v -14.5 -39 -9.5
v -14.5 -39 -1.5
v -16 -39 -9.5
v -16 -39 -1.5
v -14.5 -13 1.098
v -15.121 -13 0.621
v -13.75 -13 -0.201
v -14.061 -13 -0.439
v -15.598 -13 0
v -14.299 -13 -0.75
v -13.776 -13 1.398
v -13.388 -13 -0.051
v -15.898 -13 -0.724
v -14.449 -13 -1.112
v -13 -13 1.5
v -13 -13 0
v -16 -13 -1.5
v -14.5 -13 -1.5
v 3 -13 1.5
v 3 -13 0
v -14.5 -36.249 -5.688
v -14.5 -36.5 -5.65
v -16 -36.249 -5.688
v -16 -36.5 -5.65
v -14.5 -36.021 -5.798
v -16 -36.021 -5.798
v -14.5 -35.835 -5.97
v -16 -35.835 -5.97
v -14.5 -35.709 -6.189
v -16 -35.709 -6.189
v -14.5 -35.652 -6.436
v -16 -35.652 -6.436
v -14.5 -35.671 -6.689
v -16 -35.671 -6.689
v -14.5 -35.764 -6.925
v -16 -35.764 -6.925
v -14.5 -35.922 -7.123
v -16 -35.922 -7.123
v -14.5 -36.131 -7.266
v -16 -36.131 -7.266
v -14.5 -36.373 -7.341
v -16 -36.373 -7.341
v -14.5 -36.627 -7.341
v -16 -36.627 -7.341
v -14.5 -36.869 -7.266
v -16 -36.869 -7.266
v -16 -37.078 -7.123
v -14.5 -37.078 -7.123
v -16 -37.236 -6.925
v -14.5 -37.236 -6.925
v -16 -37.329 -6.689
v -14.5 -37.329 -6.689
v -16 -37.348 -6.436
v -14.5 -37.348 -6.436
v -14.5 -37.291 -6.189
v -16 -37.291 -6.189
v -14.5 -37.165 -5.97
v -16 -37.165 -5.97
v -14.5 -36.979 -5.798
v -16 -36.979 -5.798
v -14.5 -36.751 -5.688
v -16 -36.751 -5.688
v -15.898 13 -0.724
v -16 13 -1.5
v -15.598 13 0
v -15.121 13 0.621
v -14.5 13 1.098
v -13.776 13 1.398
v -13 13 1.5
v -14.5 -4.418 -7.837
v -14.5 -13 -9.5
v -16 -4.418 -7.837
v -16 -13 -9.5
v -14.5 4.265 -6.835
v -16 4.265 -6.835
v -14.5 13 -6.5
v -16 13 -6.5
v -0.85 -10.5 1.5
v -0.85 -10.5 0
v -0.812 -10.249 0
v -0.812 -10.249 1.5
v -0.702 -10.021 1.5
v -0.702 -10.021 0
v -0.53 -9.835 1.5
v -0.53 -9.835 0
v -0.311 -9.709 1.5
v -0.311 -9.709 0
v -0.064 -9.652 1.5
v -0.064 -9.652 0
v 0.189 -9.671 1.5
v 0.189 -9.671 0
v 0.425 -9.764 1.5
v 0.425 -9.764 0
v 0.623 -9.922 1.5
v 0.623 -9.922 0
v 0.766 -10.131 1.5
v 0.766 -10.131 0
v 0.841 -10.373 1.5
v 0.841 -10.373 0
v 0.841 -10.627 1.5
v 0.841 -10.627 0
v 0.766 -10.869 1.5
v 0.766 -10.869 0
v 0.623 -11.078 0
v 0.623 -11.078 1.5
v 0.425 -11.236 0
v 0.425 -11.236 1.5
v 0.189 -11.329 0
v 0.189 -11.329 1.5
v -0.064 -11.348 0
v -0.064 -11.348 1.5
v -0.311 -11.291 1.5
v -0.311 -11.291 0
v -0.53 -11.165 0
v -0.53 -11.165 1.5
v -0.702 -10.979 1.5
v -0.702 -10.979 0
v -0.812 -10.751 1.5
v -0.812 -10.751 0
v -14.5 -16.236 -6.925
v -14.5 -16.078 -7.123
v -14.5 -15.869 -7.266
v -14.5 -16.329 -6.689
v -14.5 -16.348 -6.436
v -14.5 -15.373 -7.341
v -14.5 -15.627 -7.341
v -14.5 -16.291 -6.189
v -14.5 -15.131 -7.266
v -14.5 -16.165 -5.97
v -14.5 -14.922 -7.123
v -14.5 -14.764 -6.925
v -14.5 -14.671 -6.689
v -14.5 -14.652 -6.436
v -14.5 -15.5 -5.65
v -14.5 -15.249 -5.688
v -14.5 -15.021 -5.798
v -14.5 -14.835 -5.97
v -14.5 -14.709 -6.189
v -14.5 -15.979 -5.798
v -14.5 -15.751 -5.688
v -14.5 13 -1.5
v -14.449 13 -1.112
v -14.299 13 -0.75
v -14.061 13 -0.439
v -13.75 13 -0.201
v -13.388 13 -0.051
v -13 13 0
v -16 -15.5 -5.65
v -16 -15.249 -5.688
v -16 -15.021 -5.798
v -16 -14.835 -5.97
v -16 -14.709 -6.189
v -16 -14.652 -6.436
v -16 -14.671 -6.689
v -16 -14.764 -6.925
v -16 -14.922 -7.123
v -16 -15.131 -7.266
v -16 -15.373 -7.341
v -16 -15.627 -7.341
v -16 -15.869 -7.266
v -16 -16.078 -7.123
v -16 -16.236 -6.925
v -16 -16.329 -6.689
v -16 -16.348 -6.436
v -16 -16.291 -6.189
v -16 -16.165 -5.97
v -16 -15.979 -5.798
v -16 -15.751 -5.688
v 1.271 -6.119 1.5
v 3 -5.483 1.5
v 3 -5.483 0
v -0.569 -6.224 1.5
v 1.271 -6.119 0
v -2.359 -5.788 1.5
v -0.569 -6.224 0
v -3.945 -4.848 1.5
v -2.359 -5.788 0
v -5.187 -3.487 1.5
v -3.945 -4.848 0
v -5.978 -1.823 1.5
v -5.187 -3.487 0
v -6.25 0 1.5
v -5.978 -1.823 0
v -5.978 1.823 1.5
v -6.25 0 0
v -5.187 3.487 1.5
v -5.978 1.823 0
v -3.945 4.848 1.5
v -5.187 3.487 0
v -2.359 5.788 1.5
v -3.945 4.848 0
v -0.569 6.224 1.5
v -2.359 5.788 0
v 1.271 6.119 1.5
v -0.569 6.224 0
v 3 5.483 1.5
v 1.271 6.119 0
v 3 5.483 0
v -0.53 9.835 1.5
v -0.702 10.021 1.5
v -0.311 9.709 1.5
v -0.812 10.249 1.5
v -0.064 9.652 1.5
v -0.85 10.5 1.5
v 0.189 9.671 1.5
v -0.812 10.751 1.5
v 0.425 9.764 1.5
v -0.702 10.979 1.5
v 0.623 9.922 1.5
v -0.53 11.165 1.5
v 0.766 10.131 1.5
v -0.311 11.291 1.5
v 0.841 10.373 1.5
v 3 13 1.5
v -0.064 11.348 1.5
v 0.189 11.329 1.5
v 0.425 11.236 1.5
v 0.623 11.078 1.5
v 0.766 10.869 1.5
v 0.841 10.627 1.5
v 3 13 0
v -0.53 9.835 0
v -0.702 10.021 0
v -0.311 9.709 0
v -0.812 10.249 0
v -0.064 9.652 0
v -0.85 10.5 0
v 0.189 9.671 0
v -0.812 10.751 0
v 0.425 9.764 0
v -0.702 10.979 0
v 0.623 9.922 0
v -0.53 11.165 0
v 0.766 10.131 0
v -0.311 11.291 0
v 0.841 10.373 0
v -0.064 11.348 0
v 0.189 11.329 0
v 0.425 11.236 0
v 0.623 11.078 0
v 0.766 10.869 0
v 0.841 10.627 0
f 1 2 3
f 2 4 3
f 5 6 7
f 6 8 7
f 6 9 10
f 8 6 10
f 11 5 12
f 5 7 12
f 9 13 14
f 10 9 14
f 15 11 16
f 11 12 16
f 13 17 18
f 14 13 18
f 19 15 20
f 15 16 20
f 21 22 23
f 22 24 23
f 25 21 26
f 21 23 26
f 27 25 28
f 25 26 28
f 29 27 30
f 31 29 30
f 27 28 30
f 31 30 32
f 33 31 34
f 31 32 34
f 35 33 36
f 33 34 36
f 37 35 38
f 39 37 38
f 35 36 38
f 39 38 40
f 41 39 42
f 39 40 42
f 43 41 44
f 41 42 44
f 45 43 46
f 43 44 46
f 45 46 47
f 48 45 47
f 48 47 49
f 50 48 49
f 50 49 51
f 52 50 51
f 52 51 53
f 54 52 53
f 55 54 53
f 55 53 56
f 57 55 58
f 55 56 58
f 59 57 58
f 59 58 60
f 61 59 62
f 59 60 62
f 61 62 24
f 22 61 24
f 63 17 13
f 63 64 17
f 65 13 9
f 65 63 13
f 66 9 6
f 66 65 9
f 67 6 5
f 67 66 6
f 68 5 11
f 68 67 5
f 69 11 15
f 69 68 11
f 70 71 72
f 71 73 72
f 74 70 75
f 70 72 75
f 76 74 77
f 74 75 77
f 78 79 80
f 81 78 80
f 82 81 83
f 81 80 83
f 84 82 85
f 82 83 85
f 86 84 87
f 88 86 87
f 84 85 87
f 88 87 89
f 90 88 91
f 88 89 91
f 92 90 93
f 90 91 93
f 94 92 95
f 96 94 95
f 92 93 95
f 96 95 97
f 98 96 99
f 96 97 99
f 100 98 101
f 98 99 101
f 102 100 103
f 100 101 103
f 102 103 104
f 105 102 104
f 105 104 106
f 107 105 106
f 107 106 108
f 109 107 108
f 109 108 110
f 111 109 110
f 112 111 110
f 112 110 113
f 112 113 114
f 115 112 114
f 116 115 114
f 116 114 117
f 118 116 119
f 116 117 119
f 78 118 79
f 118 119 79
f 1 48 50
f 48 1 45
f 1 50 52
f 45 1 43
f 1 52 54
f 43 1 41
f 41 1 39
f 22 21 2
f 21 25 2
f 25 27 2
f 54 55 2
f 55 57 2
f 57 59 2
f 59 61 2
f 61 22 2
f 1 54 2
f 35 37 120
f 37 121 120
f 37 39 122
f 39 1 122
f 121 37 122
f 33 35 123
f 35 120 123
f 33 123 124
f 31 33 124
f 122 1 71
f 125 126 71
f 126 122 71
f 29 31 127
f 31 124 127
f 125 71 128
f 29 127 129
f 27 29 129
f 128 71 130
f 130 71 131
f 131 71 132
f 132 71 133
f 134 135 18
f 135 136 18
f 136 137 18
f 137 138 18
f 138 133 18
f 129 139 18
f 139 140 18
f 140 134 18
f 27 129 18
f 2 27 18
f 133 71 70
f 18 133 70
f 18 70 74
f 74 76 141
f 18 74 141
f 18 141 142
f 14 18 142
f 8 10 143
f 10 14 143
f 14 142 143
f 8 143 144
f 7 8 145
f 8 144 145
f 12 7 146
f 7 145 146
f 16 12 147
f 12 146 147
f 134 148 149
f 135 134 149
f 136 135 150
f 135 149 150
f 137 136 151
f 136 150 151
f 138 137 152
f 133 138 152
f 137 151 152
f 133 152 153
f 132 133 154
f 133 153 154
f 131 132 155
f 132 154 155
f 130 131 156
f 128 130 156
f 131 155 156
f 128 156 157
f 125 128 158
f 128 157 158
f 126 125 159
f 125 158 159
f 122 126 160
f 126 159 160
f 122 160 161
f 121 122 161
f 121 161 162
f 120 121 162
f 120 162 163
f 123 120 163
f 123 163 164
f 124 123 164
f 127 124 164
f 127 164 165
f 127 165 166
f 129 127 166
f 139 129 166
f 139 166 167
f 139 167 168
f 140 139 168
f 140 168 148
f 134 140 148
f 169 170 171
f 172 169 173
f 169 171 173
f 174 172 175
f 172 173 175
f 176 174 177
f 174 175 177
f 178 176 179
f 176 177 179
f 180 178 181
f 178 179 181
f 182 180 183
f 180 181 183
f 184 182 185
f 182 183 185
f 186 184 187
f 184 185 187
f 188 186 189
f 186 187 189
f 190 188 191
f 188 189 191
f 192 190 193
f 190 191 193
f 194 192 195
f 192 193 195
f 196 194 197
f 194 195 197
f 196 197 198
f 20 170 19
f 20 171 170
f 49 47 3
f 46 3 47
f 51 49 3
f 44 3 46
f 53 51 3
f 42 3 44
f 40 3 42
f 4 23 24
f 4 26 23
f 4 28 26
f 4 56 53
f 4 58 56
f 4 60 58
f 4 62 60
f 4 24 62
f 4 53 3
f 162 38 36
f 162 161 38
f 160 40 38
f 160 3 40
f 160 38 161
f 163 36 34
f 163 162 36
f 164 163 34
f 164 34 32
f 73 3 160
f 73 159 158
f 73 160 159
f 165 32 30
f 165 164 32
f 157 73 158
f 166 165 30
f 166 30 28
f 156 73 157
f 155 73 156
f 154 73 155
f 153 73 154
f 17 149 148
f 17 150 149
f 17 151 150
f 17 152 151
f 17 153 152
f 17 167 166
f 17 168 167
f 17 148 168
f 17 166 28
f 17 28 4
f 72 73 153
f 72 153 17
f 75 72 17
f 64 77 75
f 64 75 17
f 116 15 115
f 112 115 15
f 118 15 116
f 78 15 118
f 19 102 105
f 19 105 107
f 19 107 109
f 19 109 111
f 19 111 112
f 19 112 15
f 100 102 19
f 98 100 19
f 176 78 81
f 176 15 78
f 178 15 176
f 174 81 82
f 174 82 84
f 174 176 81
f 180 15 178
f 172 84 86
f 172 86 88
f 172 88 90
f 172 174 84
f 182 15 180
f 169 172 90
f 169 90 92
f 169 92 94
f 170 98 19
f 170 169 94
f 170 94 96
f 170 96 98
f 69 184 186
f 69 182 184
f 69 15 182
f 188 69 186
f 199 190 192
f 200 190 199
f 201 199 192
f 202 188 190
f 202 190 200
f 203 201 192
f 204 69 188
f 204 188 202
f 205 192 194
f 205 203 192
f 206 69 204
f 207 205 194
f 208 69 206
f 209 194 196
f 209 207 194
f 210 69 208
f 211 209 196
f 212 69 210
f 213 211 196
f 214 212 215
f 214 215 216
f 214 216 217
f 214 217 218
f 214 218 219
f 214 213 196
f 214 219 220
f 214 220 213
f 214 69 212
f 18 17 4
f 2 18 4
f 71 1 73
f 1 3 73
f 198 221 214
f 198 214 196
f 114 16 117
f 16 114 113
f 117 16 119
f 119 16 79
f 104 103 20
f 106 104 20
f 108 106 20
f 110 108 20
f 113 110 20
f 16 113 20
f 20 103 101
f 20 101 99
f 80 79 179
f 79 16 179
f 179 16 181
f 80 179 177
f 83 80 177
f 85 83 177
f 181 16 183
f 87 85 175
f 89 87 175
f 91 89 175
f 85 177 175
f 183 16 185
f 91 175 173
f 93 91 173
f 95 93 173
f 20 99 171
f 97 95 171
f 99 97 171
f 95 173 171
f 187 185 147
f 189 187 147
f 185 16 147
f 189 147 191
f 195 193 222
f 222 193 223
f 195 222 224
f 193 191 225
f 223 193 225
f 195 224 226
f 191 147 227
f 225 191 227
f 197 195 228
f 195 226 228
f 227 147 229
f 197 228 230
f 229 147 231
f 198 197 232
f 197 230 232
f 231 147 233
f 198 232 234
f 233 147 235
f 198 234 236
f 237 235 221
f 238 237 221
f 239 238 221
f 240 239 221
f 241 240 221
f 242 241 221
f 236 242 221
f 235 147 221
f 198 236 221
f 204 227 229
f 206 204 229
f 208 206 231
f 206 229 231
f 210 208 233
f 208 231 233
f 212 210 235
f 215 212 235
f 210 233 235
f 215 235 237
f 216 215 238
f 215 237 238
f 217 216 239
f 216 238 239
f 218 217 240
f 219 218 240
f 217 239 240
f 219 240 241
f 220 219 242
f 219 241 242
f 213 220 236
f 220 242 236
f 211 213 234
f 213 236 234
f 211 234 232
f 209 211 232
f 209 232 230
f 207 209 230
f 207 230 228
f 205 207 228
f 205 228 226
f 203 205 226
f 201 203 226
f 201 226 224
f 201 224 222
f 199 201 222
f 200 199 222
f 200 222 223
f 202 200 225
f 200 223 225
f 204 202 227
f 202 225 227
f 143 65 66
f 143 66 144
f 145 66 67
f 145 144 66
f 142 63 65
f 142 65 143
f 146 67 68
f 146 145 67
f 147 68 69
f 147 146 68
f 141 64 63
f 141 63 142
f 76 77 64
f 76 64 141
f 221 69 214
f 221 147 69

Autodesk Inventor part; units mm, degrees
ref_plane "YZ Plane" through (0, 0, 0) normal (1, 0, 0) x (0, 1, 0)
ref_plane "XZ Plane" through (0, 0, 0) normal (0, 1, 0) x (-1, 0, 0)
ref_plane "XY Plane" through (0, 0, 0) normal (0, 0, 1) x (1, 0, 0)
sketch "スケッチ1" plane through (0, 0, 0) normal (0, 0, 1) x (1, 0, 0)
  circle A0 centre (0, 0) radius 6.25
  line L0 (0, 13) -> (-16, 13)
  line L1 (-16, 13) -> (-16, -13)
  line L2 (-16, -13) -> (0, -13)
  line L3 (0, -13) -> (0, 13)
  line L4 (0, 13) -> (3, 13)
  line L5 (3, 13) -> (3, -13)
  line L6 (3, -13) -> (0, -13)
  line L7 (0, -13) -> (0, 13)
  point P0 (-16, 0)
  point P1 (3, -5.4829)
  point P2 (3, 5.4829)
  dimension "d0" = 12.5
  dimension "d1" = 16
  dimension "d2" = 26
  dimension "d3" = 3
extrude "プレート1" add sketch "スケッチ1" along normal blind 1.5 contours A0 L3 L4 L5 | L5 L6 L3 A0 | A0 L3 L2 L1 L0
sketch "スケッチ2" plane through (-14.5, 13, 1.5) normal (-1, 0, 0) x (0, -1, 0)
  line L0 (26, 0) -> (0, 0)
  line L1 (0, 0) -> (0, -11)
  line L2 (0, -11) -> (26, -11)
  line L3 (26, -11) -> (26, 0)
edge flange "フランジ1" height 11 angle 90 thickness 1.5 bend radius 1.5 thickness toward (-1, 0, 0) relief tear relief width 1.5 relief depth 0.75 edges at (-16, 0, 0) wall of the first edge with corners at (-14.5, -13, 1.5) (-14.5, 13, 1.5) (-14.5, 13, -9.5) (-14.5, -13, -9.5)
bend "曲げ1"
corner "コーナー1"
sketch "スケッチ3" plane through (-16, -13, -9.5) normal (-1, 0, 0) x (0, 0, 1)
  line L0 (8, 0) -> (0, 0) projected
  line L1 (0, 0) -> (8, 0)
  line L2 (8, 0) -> (8, -26)
  line L3 (8, -26) -> (0, -26)
  line L4 (0, -26) -> (0, 0)
  line L5 (8, 0) -> (8, 26) projected
  arc A0 (0, 0) -> (3, 26) centre (-111.1667, 26) ccw
  line L6 (3, 20) -> (3, 26) construction
  line L7 (0, 26) -> (8, 26) projected
  line L8 (0, 0) -> (0, 26) projected
  point P0 (9.5, 13)
  point P1 (8, 0)
  dimension "d15" = 26
  dimension "d21" = 5
sheet face with bend "面2" sketch "スケッチ3" thickness 1.5 toward (1, 0, 0) bend radius 1.5 contours L2 L3 L4 L0
bend "曲げ2"
extrude "切り取り1" cut sketch "スケッチ3" against normal blind 1.5 contours L8 L7 A0
sketch "スケッチ5" plane through (0, 0, 0) normal (0, 0, -1) x (-1, 0, 0)
  circle A0 centre (0, 10.5) radius 0.85 projected
  circle A1 centre (0, -10.5) radius 0.85 projected
  point P0 (0, 0)
extrude "切り取り2" cut sketch "スケッチ5" against normal blind 1.5
sketch "スケッチ6" plane through (-16, -39, -1.5) normal (-1, 0, 0) x (0, 0, 1)
  circle A0 centre (-5, 23.5) radius 0.85 projected
  circle A1 centre (-5, 2.5) radius 0.85 projected
  point P0 (1.5, 39)
extrude "切り取り3" cut sketch "スケッチ6" against normal blind 1.5
equation "\"d23\" = Thickness"
equation "\"d25\" = Thickness"
equation "\"d27\" = Thickness"
equation "\"d4\" = Thickness"
equation "\"d5\" = BendReliefWidth"
equation "\"d6\" = BendReliefDepth"
equation "\"d7\" = MinimumRemnant"
equation "\"d8\" = TransitionRadius"
equation "\"d11\" = BendRadius"
equation "\"d12\" = CornerReliefSize"
equation "\"d13\" = GapSize"
equation "\"d14\" = JacobiRadiusSize"
equation "\"d16\" = BendRadius"
equation "\"d17\" = BendReliefWidth"
equation "\"d19\" = MinimumRemnant"
equation "\"d18\" = BendReliefDepth"
equation "\"d20\" = TransitionRadius"
equation "\"BendRadius\" = Thickness"
equation "\"BendReliefWidth\" = Thickness"
equation "\"BendReliefDepth\" = 0.5 * Thickness"
equation "\"CornerReliefSize\" = 4 * Thickness"
equation "\"MinimumRemnant\" = 2 * Thickness"
equation "\"TransitionRadius\" = BendRadius"
equation "\"JacobiRadiusSize\" = BendRadius"
equation "\"GapSize\" = Thickness"
equation "\"Thickness\" = 1.5"
properties part number "hipjoint_toleg_under_right"
